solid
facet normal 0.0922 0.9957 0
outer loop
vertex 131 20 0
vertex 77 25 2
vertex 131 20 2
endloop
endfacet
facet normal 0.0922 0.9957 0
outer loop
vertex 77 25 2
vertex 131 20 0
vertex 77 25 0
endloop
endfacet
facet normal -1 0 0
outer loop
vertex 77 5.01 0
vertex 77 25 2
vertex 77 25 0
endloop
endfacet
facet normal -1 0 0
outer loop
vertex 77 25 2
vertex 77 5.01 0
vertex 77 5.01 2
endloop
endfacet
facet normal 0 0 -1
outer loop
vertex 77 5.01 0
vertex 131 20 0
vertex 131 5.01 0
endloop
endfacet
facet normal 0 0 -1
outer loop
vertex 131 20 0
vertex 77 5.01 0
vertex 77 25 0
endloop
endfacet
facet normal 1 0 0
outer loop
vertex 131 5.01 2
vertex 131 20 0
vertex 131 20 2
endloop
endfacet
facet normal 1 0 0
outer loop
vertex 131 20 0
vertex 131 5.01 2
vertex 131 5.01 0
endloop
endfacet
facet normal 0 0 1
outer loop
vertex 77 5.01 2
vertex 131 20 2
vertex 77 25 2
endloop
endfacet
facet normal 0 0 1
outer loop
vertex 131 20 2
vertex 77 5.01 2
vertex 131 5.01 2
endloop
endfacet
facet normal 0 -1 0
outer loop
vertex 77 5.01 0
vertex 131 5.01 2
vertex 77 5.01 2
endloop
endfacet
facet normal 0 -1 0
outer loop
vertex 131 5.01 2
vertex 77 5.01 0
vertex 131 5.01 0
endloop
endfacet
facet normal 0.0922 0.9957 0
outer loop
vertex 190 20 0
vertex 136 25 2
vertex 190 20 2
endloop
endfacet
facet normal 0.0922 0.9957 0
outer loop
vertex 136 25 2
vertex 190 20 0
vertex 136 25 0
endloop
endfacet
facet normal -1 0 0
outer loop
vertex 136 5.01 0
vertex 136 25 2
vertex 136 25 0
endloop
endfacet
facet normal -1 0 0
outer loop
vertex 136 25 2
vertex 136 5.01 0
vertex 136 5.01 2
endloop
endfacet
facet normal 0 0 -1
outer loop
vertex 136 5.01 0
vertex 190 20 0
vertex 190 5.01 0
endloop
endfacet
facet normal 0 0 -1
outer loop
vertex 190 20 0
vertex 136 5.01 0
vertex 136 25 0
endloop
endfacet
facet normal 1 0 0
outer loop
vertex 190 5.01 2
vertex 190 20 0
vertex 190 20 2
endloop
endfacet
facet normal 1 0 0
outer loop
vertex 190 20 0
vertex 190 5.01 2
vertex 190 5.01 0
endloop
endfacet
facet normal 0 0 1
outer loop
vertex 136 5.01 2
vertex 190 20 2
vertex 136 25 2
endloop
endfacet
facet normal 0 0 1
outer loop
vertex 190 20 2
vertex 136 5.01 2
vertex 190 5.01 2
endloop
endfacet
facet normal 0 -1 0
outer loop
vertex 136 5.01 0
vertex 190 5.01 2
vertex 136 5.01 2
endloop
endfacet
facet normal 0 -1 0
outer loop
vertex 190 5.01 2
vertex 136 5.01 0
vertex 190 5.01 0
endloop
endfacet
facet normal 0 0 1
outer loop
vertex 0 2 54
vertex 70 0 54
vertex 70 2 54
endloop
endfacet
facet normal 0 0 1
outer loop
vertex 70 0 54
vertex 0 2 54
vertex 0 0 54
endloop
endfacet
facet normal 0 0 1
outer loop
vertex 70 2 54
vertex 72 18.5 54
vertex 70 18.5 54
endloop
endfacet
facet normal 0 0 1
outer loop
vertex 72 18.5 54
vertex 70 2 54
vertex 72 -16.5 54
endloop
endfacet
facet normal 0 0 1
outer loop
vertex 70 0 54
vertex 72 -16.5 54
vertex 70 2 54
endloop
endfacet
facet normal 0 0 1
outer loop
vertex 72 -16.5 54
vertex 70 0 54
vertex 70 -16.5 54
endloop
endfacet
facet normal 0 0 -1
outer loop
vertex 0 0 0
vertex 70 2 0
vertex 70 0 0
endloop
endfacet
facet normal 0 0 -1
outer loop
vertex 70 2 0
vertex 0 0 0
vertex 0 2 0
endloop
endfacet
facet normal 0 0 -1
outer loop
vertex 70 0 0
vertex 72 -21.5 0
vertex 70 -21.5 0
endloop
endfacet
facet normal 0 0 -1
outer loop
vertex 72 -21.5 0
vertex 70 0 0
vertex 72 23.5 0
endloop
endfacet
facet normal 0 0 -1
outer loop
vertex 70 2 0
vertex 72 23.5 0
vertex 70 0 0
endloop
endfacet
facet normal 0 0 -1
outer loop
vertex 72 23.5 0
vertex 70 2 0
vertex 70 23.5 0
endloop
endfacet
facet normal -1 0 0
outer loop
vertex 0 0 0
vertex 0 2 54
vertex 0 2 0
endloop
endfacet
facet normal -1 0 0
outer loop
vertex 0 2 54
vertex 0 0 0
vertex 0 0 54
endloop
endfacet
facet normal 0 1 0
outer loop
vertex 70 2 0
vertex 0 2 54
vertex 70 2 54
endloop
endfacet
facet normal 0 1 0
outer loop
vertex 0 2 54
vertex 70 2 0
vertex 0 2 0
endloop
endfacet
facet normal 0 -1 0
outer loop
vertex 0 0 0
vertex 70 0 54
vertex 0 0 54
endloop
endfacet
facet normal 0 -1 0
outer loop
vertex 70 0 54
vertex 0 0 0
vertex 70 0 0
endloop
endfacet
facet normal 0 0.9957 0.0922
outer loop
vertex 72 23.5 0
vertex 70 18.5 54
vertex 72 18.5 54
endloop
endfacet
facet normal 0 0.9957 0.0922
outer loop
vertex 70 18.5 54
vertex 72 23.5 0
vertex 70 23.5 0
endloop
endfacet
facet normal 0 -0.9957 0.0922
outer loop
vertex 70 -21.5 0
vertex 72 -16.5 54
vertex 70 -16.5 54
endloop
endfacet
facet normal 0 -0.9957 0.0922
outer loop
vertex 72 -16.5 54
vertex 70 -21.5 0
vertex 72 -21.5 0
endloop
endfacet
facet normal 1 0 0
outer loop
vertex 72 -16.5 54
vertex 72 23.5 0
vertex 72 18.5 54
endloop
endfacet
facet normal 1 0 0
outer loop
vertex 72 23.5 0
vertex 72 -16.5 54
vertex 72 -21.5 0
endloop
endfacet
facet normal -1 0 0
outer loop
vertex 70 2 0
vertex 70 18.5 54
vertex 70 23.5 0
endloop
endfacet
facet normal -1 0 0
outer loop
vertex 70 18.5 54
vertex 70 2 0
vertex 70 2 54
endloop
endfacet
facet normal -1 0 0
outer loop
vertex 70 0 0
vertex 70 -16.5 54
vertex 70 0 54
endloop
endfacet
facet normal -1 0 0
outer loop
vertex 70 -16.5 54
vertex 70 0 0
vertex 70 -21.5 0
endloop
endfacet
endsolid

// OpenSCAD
// file: ../../lib/primitive/trapezoid.scad
module trapezoid(size, inset) {
  polygon([
    [0, 0],
    [size[0], 0],
    [size[0] - inset, size[1]],
    [inset, size[1]],
  ]);
}

module trapezoid_prism(size, inset) {
  rotate([90, 0, 90]) {
    linear_extrude(size[0]) {
      trapezoid([size[1], size[2]], inset);
    }
  }
}
// main file
include <../../lib/primitive/trapezoid.scad>

$fn = 50;
$wall_thickness = 2;
$bleed = 0.01;

height = 54;
card_gap_width = 70;
mid_grip_width = 45;
side_grip_width = 25;
trapezoid_inset = 5;
model_gap = 5;

cube([card_gap_width + $bleed, $wall_thickness, height]);


translate([card_gap_width, -(mid_grip_width - $wall_thickness) / 2, 0 ]) {
  trapezoid_prism([$wall_thickness, mid_grip_width, height], trapezoid_inset);
}

// hacky way to get a slope on just one side
// TODO extend the trapezoid modules to handle this case
module side_prism() {
  difference() {
    trapezoid_prism([$wall_thickness, side_grip_width, height], trapezoid_inset);

    translate([-$bleed, 0, -$bleed]) {
      cube([$wall_thickness + $bleed * 2, trapezoid_inset + $bleed, height + $bleed * 2]);
    }
  }
}

translate([card_gap_width + $wall_thickness + model_gap, 0, $wall_thickness]) {
  rotate([0, 90, 0]) {
    side_prism();
  }
}

translate([card_gap_width + $wall_thickness + height + model_gap * 2, 0, $wall_thickness]) {
  rotate([0, 90, 0]) {
    side_prism();
  }
}
